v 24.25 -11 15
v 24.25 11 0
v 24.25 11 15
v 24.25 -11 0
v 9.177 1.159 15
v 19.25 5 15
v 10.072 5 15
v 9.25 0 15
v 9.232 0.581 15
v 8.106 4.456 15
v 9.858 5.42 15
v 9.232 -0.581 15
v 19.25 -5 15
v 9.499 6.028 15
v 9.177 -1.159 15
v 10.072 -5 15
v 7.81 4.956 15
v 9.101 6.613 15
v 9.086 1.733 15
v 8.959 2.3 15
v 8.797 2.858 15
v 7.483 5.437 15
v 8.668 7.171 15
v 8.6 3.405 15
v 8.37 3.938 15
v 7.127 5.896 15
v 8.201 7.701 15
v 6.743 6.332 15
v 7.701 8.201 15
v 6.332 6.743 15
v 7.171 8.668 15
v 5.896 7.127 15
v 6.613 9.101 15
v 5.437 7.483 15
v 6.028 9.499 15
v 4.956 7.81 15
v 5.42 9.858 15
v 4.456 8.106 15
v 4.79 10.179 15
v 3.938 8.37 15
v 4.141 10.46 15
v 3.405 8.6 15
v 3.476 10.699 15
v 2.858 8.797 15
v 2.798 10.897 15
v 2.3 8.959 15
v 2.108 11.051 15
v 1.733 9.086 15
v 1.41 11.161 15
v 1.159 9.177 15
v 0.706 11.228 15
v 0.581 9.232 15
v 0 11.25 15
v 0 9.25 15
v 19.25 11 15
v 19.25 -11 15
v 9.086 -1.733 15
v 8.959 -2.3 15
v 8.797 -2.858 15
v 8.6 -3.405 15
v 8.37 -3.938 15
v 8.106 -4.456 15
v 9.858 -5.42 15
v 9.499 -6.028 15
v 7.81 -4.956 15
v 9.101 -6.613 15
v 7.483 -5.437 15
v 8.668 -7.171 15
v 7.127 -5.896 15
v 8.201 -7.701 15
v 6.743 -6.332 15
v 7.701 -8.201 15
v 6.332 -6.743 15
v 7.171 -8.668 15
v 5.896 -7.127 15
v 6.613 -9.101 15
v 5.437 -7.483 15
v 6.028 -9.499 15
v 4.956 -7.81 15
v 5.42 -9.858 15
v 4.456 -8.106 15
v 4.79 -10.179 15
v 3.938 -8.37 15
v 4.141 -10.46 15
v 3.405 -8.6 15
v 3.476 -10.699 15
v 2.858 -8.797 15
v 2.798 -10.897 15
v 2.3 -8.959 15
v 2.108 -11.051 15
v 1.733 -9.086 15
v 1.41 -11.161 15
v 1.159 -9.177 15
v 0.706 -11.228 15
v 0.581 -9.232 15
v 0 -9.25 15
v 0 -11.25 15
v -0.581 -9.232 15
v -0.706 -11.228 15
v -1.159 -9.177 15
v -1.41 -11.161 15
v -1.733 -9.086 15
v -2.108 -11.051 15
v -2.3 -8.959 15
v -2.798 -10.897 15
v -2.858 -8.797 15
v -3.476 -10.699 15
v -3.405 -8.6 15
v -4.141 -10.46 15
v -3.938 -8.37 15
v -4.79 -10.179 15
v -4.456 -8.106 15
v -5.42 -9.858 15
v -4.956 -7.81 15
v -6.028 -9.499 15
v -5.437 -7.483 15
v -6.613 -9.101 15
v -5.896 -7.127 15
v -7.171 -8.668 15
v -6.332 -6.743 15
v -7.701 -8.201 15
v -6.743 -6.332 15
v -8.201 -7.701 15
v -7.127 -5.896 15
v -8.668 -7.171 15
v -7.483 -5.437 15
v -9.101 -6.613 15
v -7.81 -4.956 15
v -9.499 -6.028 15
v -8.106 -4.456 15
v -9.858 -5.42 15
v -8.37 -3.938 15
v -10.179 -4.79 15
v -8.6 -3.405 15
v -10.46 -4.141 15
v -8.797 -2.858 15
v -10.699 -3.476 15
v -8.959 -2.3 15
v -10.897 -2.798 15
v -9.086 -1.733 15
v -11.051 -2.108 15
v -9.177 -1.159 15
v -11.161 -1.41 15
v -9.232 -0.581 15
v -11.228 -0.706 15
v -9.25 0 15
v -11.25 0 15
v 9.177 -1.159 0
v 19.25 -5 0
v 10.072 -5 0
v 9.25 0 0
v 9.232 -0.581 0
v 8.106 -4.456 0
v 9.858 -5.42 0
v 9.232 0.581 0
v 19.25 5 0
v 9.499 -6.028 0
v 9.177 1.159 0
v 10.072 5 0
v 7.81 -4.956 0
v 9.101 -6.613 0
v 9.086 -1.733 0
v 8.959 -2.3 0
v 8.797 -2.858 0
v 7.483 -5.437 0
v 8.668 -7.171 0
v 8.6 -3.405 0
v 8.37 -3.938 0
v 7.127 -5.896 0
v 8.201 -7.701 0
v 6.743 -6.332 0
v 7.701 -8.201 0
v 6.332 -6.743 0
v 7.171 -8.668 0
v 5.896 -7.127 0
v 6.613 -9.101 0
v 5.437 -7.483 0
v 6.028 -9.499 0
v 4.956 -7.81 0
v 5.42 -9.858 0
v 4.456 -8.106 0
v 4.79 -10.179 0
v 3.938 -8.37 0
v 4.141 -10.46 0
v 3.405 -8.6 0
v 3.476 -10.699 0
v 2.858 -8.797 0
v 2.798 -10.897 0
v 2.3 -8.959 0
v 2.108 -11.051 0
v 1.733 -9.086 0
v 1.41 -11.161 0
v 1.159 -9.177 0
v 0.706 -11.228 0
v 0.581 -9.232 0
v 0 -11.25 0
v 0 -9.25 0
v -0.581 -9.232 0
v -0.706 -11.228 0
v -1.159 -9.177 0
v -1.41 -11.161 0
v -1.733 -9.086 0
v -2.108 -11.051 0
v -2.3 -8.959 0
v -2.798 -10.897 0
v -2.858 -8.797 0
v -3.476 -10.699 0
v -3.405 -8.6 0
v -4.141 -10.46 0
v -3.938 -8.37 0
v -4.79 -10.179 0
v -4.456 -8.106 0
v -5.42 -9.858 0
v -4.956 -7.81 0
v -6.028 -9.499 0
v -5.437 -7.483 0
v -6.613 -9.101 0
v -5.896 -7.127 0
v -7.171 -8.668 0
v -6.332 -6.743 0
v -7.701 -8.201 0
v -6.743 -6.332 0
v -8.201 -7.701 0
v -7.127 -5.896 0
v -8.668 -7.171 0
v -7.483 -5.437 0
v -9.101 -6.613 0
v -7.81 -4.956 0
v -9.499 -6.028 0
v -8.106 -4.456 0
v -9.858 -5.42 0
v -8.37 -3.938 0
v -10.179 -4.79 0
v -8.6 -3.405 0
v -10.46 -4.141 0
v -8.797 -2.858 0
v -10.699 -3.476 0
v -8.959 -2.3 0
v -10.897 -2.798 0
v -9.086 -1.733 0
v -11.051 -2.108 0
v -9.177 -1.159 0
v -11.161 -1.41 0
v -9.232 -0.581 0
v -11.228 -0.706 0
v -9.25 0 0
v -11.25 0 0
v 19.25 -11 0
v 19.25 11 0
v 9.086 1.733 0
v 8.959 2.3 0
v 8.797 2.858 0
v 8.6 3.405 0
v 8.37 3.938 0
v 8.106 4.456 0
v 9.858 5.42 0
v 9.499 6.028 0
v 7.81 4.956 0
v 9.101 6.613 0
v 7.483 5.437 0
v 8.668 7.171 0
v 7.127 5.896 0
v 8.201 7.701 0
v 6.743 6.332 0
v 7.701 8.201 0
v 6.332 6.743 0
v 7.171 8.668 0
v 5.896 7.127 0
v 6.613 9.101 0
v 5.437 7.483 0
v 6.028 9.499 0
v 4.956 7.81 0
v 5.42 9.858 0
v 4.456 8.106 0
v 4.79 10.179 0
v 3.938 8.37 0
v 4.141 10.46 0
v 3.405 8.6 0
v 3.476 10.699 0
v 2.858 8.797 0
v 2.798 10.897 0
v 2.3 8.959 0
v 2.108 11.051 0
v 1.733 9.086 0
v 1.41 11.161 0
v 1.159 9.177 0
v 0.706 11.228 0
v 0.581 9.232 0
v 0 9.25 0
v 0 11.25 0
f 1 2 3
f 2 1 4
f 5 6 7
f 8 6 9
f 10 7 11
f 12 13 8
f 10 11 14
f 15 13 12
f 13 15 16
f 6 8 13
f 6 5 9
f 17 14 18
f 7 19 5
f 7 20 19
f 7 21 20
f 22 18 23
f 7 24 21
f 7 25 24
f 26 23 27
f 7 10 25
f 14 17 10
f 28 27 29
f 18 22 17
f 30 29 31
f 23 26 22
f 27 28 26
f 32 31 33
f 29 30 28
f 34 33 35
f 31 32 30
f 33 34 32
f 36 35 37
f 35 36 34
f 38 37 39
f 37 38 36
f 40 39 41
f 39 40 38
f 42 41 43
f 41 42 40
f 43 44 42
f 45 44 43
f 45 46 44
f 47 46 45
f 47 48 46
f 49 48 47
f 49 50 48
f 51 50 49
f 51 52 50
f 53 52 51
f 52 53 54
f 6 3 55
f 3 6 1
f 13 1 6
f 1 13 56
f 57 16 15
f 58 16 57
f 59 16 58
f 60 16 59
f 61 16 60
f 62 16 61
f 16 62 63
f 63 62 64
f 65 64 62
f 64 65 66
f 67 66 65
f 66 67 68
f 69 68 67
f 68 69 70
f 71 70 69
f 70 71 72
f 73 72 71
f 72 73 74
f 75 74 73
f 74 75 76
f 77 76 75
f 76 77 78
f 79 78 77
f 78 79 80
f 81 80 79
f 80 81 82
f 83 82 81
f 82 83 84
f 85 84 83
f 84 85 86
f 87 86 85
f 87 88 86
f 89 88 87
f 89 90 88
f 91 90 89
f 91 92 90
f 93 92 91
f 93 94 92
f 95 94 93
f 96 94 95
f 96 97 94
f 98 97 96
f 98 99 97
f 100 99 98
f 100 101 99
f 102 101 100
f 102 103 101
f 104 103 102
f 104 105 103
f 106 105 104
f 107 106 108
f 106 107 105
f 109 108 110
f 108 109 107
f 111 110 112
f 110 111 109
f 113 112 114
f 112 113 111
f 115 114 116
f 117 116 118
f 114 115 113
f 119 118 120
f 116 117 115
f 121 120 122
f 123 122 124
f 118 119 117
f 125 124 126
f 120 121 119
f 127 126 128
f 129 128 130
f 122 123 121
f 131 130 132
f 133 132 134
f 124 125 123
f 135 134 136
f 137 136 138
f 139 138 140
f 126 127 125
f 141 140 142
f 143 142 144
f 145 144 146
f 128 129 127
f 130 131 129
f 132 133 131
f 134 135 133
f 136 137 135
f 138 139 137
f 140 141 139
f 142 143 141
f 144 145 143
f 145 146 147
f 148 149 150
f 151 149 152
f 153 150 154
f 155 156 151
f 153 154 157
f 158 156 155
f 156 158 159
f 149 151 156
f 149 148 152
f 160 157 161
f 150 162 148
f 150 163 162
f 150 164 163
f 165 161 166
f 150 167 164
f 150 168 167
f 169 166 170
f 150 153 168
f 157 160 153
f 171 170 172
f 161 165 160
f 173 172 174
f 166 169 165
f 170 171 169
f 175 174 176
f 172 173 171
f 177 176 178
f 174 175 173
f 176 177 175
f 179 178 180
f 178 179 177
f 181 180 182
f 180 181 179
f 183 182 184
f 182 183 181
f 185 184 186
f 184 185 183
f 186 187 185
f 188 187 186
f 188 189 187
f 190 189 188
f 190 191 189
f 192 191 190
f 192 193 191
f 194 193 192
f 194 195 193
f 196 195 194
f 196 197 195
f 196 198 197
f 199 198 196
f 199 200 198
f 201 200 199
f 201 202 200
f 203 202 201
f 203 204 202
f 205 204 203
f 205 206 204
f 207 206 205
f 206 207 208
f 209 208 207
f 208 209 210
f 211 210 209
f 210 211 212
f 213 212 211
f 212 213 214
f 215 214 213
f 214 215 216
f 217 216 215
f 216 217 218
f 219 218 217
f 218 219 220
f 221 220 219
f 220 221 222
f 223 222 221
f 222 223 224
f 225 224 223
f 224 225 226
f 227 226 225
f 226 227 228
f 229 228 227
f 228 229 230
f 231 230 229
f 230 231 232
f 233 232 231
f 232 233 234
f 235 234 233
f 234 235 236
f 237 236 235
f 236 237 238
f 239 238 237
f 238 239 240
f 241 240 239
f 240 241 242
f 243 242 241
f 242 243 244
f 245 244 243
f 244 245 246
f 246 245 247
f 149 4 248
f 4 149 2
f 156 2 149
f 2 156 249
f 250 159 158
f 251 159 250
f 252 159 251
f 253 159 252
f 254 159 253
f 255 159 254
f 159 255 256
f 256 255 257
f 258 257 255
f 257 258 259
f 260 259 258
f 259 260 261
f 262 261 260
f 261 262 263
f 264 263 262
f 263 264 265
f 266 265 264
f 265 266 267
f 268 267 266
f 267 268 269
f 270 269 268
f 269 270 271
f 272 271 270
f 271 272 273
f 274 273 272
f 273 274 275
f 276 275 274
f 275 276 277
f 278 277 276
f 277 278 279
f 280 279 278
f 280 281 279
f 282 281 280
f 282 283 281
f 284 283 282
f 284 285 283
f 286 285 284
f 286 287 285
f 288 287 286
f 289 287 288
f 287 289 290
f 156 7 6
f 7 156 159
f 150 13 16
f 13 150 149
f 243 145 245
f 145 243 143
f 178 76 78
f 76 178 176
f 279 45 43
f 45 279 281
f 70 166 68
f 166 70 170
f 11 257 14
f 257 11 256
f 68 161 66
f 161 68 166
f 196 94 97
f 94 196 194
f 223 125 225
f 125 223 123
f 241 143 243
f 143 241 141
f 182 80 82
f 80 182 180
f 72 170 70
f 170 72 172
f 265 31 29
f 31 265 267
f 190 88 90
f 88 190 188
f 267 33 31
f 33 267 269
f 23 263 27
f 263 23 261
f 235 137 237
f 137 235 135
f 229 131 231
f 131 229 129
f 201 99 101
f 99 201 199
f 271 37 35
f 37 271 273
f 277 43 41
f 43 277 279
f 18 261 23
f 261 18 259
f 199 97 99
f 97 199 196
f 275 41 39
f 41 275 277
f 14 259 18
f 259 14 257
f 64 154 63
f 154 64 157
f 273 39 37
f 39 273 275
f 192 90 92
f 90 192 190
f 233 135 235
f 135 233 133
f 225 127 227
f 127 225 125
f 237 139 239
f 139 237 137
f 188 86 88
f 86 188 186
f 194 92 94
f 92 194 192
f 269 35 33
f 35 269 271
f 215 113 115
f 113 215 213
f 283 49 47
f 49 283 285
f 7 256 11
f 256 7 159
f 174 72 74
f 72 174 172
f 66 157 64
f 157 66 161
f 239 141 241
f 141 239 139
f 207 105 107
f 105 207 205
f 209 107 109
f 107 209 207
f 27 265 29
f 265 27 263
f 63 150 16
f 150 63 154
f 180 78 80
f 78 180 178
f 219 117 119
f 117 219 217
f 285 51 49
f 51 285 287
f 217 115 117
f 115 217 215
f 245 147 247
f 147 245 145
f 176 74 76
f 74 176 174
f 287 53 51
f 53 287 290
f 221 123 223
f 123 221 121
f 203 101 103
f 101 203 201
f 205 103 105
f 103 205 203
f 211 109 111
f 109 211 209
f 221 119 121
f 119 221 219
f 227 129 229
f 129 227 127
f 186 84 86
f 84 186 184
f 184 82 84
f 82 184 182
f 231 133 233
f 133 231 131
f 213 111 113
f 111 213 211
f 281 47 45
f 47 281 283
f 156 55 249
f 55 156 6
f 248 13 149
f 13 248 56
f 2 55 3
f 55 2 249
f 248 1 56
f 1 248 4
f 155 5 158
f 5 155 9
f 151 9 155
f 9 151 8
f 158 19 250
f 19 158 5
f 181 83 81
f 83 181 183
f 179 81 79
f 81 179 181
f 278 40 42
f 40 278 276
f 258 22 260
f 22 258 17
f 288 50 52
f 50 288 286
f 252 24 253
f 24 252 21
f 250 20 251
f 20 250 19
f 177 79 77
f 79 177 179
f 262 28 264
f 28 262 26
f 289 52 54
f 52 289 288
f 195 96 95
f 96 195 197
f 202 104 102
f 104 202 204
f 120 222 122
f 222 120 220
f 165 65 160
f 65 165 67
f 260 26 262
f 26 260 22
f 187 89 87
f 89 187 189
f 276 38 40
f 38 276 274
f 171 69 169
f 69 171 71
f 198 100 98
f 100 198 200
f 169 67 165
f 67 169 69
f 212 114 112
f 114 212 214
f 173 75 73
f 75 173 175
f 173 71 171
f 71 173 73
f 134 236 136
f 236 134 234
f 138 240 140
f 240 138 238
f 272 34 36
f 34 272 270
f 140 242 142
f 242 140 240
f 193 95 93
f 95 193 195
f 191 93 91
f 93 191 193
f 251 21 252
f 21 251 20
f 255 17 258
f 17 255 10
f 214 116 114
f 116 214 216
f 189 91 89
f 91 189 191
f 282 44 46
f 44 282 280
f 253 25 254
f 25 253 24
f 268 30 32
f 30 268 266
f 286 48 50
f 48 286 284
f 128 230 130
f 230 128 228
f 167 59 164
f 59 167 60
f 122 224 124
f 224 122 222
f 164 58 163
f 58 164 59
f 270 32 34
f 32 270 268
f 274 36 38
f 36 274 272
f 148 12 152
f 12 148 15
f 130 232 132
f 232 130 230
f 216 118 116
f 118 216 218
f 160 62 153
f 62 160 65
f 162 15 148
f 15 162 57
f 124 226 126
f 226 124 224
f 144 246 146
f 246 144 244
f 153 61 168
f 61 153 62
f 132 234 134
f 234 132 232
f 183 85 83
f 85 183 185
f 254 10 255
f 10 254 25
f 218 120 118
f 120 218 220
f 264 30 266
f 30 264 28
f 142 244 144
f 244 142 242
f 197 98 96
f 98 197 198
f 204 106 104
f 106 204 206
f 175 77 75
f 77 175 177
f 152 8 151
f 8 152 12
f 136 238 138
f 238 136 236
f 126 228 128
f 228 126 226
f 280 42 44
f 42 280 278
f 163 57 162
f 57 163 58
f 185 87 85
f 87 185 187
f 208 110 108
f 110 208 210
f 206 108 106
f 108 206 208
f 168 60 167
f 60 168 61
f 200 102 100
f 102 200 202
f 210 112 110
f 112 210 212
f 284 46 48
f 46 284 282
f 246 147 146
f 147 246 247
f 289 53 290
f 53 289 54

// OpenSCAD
d = 18.5;
h = 15;
wall = 2;

difference(){
    union(){
        translate( [ 0, -5, 0 ] )
            cube( [ d / 2 + 15, 10, h ] );
        cylinder( d = d + 2 * wall, h = h, $fn = 100 );
        translate( [ d / 2 + 15 - 5, -11, 0 ] )
            cube( [ 5, 22, h ] );
    }
    
    translate( [ 0, 0, -1 ] )
        cylinder( d = d, h = h + 2, $fn = 100 );
    
    rotate( 90, [ 0, 0, 1 ] )
        translate( [ 0, 0, -1 ] )
            cube( [ 100, 100, 100 ] );
}
